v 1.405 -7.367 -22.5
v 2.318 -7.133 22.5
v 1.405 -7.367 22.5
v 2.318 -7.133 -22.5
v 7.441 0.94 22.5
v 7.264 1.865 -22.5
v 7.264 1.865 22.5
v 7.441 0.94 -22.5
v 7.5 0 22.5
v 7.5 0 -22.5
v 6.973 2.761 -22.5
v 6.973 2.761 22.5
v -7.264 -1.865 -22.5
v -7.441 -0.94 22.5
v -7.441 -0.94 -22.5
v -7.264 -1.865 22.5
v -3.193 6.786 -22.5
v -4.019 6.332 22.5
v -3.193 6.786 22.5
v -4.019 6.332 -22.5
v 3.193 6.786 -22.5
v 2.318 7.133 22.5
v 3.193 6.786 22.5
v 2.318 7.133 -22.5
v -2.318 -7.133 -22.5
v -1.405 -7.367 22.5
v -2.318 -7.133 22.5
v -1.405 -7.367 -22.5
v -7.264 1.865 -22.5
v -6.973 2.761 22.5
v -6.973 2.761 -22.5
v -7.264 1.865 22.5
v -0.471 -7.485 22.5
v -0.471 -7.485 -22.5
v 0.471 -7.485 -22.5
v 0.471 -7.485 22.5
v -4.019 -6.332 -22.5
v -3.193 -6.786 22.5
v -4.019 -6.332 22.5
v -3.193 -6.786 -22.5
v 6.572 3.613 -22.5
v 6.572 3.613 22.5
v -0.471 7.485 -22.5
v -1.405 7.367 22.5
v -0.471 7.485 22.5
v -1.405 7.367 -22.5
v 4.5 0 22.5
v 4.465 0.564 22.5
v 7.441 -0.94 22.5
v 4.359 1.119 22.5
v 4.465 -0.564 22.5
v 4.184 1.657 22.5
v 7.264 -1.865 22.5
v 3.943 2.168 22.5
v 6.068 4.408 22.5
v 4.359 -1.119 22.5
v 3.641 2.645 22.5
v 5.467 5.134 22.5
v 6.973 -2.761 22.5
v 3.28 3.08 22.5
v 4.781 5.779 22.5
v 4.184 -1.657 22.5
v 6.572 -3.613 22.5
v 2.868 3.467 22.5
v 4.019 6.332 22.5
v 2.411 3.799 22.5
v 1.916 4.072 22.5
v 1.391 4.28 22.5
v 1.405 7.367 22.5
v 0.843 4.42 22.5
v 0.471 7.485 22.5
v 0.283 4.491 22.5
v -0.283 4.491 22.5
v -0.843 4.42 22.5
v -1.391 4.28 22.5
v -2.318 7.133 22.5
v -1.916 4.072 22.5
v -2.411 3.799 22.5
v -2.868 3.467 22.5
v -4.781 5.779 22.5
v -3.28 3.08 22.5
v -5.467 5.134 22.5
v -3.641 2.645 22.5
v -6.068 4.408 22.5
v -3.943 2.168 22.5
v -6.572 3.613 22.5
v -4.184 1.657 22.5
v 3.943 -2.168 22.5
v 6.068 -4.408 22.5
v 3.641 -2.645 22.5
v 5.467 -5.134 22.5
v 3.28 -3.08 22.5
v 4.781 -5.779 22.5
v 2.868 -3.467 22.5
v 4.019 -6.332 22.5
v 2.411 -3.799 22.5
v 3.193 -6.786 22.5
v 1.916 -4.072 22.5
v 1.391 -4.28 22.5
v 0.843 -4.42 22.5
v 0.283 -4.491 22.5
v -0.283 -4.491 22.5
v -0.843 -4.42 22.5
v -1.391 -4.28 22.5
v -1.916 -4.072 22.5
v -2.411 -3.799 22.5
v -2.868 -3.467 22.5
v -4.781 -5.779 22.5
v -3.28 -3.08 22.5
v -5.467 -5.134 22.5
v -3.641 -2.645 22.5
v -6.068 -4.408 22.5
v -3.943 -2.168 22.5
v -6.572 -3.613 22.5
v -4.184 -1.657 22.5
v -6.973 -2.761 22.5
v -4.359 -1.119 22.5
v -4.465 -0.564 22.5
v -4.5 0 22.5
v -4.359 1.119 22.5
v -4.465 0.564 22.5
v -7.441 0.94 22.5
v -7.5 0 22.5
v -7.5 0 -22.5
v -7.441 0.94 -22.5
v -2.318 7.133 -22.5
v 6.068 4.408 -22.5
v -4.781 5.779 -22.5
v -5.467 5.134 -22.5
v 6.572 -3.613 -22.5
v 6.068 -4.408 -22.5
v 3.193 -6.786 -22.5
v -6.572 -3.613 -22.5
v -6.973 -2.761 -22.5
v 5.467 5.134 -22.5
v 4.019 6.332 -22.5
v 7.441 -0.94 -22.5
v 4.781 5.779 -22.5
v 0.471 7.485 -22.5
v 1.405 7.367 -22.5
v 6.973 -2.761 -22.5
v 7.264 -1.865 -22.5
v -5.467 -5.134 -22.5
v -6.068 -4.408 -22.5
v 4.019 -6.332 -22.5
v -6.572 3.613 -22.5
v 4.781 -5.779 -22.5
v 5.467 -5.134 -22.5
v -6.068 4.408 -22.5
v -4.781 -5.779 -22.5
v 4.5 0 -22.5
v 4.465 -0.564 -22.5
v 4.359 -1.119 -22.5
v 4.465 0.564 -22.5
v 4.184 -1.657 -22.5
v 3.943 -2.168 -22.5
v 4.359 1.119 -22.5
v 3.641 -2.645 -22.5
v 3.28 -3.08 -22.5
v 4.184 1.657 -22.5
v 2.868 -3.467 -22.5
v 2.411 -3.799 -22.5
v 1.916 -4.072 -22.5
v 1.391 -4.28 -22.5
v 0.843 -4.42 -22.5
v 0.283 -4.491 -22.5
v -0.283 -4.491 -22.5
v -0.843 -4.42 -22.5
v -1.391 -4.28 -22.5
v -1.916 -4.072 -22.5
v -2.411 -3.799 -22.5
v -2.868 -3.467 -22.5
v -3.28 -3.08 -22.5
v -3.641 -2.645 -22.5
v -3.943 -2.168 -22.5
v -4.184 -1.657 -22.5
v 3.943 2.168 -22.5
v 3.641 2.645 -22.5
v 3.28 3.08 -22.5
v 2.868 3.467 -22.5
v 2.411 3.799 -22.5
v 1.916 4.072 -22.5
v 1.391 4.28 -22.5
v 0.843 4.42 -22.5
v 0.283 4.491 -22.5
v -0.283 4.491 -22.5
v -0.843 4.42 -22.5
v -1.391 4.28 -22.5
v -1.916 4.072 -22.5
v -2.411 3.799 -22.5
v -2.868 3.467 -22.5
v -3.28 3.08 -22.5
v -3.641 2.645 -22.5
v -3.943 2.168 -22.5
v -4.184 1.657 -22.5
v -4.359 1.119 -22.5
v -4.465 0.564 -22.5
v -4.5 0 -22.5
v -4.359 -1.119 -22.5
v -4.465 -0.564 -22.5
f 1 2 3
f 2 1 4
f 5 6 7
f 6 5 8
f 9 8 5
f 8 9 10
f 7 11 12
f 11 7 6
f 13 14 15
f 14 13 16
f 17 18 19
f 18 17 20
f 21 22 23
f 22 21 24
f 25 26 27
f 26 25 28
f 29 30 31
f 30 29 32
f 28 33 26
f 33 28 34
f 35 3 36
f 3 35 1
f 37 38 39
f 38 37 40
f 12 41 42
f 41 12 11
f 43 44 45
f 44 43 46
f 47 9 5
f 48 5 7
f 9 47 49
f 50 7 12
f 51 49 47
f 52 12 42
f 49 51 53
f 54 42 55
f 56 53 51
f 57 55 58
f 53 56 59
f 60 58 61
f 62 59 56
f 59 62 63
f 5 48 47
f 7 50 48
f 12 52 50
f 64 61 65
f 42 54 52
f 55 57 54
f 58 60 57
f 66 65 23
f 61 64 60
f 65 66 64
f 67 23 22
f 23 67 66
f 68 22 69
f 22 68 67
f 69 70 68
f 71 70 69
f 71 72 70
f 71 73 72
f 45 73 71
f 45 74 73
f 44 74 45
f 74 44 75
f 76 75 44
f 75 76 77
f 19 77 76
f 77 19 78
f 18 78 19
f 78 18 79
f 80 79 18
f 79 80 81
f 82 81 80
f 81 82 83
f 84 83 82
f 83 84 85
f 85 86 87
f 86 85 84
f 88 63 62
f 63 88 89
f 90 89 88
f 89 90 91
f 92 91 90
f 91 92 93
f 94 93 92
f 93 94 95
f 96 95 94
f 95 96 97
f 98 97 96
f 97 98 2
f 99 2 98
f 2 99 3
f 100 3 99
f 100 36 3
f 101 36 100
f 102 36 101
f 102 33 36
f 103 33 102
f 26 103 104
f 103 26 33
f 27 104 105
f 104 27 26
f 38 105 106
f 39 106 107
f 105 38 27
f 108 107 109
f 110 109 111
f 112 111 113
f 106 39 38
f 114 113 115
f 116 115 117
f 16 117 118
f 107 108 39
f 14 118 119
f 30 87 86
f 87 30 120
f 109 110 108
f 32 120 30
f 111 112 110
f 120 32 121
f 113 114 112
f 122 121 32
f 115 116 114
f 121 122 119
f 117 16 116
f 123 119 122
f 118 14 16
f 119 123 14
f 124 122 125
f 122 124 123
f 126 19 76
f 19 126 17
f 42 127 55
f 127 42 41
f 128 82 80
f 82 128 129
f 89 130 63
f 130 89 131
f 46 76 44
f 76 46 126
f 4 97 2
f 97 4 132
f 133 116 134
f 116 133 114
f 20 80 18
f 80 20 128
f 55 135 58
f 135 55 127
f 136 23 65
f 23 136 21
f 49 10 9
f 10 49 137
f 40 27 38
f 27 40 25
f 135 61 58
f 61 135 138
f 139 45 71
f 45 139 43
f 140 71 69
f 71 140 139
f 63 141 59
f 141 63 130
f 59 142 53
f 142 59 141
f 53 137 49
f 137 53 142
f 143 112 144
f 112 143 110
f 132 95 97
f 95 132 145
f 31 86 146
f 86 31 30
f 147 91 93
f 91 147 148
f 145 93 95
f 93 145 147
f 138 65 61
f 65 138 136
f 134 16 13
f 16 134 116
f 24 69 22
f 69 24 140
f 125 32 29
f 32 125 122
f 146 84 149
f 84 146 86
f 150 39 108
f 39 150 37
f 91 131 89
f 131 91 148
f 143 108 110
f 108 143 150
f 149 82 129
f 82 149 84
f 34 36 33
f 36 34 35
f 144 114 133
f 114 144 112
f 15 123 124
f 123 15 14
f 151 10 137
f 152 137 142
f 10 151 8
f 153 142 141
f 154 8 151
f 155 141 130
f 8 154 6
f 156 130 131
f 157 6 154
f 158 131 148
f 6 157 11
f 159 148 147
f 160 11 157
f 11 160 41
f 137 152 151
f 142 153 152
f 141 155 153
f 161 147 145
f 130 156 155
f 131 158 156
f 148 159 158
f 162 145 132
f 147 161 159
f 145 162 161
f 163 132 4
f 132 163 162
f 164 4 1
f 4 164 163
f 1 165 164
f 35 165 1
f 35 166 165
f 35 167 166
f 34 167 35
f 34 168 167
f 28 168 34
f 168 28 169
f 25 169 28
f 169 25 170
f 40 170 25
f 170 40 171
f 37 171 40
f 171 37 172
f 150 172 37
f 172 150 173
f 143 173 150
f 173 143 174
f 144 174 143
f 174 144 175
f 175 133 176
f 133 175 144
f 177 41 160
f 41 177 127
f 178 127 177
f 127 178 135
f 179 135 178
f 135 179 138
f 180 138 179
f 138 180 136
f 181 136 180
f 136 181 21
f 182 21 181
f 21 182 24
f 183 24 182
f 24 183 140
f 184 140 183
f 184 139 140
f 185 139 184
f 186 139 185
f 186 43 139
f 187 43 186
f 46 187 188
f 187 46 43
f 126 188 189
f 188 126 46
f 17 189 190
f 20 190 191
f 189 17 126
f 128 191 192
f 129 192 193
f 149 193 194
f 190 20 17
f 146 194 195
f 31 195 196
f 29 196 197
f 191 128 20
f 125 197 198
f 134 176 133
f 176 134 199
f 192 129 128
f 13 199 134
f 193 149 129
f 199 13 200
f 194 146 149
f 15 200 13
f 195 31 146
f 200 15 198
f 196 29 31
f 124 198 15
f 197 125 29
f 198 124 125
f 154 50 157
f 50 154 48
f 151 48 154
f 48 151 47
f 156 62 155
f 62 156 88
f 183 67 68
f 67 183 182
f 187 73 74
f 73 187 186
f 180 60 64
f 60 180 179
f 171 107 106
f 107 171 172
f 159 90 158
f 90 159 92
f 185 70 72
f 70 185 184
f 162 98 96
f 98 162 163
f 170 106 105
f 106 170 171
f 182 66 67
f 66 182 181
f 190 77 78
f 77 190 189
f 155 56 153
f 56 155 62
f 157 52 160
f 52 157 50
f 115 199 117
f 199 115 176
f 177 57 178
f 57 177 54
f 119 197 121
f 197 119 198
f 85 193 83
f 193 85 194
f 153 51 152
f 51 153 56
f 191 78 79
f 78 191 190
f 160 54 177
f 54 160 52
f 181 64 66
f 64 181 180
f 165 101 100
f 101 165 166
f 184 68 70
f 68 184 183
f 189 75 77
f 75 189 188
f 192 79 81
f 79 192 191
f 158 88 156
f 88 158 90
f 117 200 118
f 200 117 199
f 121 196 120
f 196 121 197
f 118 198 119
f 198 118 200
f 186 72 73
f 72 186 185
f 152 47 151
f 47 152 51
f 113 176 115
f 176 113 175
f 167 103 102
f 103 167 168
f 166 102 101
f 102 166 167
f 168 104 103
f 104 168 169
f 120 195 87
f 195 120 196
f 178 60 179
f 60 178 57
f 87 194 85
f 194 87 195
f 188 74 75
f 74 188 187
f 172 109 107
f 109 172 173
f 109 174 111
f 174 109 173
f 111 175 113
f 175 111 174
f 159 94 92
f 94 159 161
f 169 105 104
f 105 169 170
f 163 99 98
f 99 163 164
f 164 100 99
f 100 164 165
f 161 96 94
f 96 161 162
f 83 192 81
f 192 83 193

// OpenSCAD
$fn = 50;


difference() {
	union() {
		translate(v = [0, 0, -22.5000000000]) {
			cylinder(h = 45, r = 7.5000000000);
		}
	}
	union() {
		translate(v = [0, 0, -100.0000000000]) {
			cylinder(h = 200, r = 4.5000000000);
		}
	}
}
